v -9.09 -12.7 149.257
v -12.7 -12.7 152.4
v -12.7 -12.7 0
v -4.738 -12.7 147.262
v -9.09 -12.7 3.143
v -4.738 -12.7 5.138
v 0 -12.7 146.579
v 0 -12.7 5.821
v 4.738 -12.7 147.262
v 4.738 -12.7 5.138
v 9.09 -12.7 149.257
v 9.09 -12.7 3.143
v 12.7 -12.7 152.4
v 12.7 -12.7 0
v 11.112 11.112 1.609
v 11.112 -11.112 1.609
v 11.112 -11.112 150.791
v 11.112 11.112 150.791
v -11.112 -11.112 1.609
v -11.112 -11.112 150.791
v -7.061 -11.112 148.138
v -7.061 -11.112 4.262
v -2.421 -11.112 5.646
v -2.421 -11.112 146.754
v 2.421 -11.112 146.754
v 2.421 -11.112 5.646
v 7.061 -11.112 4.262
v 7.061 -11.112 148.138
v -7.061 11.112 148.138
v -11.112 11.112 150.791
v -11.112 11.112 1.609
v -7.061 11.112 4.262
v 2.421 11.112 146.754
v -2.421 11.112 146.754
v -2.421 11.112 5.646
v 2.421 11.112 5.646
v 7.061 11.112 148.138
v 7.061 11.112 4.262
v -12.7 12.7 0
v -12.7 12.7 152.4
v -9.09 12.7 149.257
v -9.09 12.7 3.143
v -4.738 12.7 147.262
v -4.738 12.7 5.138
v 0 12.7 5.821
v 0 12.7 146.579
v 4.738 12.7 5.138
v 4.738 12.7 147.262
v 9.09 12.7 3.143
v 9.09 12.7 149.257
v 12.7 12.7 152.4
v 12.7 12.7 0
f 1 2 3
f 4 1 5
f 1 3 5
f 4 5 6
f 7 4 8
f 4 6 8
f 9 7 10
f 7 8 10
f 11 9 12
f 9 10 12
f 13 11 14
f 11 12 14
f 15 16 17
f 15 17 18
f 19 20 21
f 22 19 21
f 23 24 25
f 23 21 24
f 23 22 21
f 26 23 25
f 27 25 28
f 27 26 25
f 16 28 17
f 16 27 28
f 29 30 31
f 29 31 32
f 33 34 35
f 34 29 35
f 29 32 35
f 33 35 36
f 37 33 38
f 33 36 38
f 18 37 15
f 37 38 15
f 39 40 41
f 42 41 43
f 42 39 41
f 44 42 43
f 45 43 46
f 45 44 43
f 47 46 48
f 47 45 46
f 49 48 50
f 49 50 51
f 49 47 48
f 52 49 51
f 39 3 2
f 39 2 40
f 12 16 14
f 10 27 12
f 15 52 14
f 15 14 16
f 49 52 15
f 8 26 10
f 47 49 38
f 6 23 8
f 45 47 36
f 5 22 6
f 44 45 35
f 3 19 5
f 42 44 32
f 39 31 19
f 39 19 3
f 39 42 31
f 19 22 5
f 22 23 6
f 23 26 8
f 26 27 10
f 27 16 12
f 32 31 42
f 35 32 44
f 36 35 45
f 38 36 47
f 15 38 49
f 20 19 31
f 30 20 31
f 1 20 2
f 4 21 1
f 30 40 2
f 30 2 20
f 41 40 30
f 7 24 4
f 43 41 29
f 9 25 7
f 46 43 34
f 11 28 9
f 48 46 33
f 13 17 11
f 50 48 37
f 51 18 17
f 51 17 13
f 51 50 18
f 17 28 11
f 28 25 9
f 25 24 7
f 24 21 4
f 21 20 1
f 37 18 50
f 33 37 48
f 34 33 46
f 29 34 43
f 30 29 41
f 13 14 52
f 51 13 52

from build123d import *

# Parameters (mm, degrees)
SKETCH1_W           = 25.4
SKETCH1_H           = 25.4
SKETCH1_W_2         = 22.225
SKETCH1_H_2         = 22.225
BOSS_EXTRUDE1_DEPTH = 152.4
CUT_EXTRUDE1_DEPTH  = 156.02325632


with BuildPart() as part:
    # Sketch1 → Boss-Extrude1 (new body)
    with BuildSketch(Plane.XY):
        Rectangle(SKETCH1_W, SKETCH1_H)
        Rectangle(SKETCH1_W_2, SKETCH1_H_2, mode=Mode.SUBTRACT)
    extrude(amount=BOSS_EXTRUDE1_DEPTH)

    # Sketch2 → Cut-Extrude1 (cut, through all)
    with BuildSketch(Plane(origin=(0, 12.7, 0), x_dir=(1, 0, 0), z_dir=(0, 1, 0))):
        with BuildLine():
            Line((-12.7, 0), (12.7, 0))
            ThreePointArc((12.7, 0), (0, -5.821345112), (-12.7, 0))
        make_face()
        with BuildLine():
            Line((12.7, -152.4), (-12.7, -152.4))
            ThreePointArc((-12.7, -152.4), (0, -146.578654888), (12.7, -152.4))
        make_face()
    extrude(amount=-CUT_EXTRUDE1_DEPTH, mode=Mode.SUBTRACT)


solid = part.part
